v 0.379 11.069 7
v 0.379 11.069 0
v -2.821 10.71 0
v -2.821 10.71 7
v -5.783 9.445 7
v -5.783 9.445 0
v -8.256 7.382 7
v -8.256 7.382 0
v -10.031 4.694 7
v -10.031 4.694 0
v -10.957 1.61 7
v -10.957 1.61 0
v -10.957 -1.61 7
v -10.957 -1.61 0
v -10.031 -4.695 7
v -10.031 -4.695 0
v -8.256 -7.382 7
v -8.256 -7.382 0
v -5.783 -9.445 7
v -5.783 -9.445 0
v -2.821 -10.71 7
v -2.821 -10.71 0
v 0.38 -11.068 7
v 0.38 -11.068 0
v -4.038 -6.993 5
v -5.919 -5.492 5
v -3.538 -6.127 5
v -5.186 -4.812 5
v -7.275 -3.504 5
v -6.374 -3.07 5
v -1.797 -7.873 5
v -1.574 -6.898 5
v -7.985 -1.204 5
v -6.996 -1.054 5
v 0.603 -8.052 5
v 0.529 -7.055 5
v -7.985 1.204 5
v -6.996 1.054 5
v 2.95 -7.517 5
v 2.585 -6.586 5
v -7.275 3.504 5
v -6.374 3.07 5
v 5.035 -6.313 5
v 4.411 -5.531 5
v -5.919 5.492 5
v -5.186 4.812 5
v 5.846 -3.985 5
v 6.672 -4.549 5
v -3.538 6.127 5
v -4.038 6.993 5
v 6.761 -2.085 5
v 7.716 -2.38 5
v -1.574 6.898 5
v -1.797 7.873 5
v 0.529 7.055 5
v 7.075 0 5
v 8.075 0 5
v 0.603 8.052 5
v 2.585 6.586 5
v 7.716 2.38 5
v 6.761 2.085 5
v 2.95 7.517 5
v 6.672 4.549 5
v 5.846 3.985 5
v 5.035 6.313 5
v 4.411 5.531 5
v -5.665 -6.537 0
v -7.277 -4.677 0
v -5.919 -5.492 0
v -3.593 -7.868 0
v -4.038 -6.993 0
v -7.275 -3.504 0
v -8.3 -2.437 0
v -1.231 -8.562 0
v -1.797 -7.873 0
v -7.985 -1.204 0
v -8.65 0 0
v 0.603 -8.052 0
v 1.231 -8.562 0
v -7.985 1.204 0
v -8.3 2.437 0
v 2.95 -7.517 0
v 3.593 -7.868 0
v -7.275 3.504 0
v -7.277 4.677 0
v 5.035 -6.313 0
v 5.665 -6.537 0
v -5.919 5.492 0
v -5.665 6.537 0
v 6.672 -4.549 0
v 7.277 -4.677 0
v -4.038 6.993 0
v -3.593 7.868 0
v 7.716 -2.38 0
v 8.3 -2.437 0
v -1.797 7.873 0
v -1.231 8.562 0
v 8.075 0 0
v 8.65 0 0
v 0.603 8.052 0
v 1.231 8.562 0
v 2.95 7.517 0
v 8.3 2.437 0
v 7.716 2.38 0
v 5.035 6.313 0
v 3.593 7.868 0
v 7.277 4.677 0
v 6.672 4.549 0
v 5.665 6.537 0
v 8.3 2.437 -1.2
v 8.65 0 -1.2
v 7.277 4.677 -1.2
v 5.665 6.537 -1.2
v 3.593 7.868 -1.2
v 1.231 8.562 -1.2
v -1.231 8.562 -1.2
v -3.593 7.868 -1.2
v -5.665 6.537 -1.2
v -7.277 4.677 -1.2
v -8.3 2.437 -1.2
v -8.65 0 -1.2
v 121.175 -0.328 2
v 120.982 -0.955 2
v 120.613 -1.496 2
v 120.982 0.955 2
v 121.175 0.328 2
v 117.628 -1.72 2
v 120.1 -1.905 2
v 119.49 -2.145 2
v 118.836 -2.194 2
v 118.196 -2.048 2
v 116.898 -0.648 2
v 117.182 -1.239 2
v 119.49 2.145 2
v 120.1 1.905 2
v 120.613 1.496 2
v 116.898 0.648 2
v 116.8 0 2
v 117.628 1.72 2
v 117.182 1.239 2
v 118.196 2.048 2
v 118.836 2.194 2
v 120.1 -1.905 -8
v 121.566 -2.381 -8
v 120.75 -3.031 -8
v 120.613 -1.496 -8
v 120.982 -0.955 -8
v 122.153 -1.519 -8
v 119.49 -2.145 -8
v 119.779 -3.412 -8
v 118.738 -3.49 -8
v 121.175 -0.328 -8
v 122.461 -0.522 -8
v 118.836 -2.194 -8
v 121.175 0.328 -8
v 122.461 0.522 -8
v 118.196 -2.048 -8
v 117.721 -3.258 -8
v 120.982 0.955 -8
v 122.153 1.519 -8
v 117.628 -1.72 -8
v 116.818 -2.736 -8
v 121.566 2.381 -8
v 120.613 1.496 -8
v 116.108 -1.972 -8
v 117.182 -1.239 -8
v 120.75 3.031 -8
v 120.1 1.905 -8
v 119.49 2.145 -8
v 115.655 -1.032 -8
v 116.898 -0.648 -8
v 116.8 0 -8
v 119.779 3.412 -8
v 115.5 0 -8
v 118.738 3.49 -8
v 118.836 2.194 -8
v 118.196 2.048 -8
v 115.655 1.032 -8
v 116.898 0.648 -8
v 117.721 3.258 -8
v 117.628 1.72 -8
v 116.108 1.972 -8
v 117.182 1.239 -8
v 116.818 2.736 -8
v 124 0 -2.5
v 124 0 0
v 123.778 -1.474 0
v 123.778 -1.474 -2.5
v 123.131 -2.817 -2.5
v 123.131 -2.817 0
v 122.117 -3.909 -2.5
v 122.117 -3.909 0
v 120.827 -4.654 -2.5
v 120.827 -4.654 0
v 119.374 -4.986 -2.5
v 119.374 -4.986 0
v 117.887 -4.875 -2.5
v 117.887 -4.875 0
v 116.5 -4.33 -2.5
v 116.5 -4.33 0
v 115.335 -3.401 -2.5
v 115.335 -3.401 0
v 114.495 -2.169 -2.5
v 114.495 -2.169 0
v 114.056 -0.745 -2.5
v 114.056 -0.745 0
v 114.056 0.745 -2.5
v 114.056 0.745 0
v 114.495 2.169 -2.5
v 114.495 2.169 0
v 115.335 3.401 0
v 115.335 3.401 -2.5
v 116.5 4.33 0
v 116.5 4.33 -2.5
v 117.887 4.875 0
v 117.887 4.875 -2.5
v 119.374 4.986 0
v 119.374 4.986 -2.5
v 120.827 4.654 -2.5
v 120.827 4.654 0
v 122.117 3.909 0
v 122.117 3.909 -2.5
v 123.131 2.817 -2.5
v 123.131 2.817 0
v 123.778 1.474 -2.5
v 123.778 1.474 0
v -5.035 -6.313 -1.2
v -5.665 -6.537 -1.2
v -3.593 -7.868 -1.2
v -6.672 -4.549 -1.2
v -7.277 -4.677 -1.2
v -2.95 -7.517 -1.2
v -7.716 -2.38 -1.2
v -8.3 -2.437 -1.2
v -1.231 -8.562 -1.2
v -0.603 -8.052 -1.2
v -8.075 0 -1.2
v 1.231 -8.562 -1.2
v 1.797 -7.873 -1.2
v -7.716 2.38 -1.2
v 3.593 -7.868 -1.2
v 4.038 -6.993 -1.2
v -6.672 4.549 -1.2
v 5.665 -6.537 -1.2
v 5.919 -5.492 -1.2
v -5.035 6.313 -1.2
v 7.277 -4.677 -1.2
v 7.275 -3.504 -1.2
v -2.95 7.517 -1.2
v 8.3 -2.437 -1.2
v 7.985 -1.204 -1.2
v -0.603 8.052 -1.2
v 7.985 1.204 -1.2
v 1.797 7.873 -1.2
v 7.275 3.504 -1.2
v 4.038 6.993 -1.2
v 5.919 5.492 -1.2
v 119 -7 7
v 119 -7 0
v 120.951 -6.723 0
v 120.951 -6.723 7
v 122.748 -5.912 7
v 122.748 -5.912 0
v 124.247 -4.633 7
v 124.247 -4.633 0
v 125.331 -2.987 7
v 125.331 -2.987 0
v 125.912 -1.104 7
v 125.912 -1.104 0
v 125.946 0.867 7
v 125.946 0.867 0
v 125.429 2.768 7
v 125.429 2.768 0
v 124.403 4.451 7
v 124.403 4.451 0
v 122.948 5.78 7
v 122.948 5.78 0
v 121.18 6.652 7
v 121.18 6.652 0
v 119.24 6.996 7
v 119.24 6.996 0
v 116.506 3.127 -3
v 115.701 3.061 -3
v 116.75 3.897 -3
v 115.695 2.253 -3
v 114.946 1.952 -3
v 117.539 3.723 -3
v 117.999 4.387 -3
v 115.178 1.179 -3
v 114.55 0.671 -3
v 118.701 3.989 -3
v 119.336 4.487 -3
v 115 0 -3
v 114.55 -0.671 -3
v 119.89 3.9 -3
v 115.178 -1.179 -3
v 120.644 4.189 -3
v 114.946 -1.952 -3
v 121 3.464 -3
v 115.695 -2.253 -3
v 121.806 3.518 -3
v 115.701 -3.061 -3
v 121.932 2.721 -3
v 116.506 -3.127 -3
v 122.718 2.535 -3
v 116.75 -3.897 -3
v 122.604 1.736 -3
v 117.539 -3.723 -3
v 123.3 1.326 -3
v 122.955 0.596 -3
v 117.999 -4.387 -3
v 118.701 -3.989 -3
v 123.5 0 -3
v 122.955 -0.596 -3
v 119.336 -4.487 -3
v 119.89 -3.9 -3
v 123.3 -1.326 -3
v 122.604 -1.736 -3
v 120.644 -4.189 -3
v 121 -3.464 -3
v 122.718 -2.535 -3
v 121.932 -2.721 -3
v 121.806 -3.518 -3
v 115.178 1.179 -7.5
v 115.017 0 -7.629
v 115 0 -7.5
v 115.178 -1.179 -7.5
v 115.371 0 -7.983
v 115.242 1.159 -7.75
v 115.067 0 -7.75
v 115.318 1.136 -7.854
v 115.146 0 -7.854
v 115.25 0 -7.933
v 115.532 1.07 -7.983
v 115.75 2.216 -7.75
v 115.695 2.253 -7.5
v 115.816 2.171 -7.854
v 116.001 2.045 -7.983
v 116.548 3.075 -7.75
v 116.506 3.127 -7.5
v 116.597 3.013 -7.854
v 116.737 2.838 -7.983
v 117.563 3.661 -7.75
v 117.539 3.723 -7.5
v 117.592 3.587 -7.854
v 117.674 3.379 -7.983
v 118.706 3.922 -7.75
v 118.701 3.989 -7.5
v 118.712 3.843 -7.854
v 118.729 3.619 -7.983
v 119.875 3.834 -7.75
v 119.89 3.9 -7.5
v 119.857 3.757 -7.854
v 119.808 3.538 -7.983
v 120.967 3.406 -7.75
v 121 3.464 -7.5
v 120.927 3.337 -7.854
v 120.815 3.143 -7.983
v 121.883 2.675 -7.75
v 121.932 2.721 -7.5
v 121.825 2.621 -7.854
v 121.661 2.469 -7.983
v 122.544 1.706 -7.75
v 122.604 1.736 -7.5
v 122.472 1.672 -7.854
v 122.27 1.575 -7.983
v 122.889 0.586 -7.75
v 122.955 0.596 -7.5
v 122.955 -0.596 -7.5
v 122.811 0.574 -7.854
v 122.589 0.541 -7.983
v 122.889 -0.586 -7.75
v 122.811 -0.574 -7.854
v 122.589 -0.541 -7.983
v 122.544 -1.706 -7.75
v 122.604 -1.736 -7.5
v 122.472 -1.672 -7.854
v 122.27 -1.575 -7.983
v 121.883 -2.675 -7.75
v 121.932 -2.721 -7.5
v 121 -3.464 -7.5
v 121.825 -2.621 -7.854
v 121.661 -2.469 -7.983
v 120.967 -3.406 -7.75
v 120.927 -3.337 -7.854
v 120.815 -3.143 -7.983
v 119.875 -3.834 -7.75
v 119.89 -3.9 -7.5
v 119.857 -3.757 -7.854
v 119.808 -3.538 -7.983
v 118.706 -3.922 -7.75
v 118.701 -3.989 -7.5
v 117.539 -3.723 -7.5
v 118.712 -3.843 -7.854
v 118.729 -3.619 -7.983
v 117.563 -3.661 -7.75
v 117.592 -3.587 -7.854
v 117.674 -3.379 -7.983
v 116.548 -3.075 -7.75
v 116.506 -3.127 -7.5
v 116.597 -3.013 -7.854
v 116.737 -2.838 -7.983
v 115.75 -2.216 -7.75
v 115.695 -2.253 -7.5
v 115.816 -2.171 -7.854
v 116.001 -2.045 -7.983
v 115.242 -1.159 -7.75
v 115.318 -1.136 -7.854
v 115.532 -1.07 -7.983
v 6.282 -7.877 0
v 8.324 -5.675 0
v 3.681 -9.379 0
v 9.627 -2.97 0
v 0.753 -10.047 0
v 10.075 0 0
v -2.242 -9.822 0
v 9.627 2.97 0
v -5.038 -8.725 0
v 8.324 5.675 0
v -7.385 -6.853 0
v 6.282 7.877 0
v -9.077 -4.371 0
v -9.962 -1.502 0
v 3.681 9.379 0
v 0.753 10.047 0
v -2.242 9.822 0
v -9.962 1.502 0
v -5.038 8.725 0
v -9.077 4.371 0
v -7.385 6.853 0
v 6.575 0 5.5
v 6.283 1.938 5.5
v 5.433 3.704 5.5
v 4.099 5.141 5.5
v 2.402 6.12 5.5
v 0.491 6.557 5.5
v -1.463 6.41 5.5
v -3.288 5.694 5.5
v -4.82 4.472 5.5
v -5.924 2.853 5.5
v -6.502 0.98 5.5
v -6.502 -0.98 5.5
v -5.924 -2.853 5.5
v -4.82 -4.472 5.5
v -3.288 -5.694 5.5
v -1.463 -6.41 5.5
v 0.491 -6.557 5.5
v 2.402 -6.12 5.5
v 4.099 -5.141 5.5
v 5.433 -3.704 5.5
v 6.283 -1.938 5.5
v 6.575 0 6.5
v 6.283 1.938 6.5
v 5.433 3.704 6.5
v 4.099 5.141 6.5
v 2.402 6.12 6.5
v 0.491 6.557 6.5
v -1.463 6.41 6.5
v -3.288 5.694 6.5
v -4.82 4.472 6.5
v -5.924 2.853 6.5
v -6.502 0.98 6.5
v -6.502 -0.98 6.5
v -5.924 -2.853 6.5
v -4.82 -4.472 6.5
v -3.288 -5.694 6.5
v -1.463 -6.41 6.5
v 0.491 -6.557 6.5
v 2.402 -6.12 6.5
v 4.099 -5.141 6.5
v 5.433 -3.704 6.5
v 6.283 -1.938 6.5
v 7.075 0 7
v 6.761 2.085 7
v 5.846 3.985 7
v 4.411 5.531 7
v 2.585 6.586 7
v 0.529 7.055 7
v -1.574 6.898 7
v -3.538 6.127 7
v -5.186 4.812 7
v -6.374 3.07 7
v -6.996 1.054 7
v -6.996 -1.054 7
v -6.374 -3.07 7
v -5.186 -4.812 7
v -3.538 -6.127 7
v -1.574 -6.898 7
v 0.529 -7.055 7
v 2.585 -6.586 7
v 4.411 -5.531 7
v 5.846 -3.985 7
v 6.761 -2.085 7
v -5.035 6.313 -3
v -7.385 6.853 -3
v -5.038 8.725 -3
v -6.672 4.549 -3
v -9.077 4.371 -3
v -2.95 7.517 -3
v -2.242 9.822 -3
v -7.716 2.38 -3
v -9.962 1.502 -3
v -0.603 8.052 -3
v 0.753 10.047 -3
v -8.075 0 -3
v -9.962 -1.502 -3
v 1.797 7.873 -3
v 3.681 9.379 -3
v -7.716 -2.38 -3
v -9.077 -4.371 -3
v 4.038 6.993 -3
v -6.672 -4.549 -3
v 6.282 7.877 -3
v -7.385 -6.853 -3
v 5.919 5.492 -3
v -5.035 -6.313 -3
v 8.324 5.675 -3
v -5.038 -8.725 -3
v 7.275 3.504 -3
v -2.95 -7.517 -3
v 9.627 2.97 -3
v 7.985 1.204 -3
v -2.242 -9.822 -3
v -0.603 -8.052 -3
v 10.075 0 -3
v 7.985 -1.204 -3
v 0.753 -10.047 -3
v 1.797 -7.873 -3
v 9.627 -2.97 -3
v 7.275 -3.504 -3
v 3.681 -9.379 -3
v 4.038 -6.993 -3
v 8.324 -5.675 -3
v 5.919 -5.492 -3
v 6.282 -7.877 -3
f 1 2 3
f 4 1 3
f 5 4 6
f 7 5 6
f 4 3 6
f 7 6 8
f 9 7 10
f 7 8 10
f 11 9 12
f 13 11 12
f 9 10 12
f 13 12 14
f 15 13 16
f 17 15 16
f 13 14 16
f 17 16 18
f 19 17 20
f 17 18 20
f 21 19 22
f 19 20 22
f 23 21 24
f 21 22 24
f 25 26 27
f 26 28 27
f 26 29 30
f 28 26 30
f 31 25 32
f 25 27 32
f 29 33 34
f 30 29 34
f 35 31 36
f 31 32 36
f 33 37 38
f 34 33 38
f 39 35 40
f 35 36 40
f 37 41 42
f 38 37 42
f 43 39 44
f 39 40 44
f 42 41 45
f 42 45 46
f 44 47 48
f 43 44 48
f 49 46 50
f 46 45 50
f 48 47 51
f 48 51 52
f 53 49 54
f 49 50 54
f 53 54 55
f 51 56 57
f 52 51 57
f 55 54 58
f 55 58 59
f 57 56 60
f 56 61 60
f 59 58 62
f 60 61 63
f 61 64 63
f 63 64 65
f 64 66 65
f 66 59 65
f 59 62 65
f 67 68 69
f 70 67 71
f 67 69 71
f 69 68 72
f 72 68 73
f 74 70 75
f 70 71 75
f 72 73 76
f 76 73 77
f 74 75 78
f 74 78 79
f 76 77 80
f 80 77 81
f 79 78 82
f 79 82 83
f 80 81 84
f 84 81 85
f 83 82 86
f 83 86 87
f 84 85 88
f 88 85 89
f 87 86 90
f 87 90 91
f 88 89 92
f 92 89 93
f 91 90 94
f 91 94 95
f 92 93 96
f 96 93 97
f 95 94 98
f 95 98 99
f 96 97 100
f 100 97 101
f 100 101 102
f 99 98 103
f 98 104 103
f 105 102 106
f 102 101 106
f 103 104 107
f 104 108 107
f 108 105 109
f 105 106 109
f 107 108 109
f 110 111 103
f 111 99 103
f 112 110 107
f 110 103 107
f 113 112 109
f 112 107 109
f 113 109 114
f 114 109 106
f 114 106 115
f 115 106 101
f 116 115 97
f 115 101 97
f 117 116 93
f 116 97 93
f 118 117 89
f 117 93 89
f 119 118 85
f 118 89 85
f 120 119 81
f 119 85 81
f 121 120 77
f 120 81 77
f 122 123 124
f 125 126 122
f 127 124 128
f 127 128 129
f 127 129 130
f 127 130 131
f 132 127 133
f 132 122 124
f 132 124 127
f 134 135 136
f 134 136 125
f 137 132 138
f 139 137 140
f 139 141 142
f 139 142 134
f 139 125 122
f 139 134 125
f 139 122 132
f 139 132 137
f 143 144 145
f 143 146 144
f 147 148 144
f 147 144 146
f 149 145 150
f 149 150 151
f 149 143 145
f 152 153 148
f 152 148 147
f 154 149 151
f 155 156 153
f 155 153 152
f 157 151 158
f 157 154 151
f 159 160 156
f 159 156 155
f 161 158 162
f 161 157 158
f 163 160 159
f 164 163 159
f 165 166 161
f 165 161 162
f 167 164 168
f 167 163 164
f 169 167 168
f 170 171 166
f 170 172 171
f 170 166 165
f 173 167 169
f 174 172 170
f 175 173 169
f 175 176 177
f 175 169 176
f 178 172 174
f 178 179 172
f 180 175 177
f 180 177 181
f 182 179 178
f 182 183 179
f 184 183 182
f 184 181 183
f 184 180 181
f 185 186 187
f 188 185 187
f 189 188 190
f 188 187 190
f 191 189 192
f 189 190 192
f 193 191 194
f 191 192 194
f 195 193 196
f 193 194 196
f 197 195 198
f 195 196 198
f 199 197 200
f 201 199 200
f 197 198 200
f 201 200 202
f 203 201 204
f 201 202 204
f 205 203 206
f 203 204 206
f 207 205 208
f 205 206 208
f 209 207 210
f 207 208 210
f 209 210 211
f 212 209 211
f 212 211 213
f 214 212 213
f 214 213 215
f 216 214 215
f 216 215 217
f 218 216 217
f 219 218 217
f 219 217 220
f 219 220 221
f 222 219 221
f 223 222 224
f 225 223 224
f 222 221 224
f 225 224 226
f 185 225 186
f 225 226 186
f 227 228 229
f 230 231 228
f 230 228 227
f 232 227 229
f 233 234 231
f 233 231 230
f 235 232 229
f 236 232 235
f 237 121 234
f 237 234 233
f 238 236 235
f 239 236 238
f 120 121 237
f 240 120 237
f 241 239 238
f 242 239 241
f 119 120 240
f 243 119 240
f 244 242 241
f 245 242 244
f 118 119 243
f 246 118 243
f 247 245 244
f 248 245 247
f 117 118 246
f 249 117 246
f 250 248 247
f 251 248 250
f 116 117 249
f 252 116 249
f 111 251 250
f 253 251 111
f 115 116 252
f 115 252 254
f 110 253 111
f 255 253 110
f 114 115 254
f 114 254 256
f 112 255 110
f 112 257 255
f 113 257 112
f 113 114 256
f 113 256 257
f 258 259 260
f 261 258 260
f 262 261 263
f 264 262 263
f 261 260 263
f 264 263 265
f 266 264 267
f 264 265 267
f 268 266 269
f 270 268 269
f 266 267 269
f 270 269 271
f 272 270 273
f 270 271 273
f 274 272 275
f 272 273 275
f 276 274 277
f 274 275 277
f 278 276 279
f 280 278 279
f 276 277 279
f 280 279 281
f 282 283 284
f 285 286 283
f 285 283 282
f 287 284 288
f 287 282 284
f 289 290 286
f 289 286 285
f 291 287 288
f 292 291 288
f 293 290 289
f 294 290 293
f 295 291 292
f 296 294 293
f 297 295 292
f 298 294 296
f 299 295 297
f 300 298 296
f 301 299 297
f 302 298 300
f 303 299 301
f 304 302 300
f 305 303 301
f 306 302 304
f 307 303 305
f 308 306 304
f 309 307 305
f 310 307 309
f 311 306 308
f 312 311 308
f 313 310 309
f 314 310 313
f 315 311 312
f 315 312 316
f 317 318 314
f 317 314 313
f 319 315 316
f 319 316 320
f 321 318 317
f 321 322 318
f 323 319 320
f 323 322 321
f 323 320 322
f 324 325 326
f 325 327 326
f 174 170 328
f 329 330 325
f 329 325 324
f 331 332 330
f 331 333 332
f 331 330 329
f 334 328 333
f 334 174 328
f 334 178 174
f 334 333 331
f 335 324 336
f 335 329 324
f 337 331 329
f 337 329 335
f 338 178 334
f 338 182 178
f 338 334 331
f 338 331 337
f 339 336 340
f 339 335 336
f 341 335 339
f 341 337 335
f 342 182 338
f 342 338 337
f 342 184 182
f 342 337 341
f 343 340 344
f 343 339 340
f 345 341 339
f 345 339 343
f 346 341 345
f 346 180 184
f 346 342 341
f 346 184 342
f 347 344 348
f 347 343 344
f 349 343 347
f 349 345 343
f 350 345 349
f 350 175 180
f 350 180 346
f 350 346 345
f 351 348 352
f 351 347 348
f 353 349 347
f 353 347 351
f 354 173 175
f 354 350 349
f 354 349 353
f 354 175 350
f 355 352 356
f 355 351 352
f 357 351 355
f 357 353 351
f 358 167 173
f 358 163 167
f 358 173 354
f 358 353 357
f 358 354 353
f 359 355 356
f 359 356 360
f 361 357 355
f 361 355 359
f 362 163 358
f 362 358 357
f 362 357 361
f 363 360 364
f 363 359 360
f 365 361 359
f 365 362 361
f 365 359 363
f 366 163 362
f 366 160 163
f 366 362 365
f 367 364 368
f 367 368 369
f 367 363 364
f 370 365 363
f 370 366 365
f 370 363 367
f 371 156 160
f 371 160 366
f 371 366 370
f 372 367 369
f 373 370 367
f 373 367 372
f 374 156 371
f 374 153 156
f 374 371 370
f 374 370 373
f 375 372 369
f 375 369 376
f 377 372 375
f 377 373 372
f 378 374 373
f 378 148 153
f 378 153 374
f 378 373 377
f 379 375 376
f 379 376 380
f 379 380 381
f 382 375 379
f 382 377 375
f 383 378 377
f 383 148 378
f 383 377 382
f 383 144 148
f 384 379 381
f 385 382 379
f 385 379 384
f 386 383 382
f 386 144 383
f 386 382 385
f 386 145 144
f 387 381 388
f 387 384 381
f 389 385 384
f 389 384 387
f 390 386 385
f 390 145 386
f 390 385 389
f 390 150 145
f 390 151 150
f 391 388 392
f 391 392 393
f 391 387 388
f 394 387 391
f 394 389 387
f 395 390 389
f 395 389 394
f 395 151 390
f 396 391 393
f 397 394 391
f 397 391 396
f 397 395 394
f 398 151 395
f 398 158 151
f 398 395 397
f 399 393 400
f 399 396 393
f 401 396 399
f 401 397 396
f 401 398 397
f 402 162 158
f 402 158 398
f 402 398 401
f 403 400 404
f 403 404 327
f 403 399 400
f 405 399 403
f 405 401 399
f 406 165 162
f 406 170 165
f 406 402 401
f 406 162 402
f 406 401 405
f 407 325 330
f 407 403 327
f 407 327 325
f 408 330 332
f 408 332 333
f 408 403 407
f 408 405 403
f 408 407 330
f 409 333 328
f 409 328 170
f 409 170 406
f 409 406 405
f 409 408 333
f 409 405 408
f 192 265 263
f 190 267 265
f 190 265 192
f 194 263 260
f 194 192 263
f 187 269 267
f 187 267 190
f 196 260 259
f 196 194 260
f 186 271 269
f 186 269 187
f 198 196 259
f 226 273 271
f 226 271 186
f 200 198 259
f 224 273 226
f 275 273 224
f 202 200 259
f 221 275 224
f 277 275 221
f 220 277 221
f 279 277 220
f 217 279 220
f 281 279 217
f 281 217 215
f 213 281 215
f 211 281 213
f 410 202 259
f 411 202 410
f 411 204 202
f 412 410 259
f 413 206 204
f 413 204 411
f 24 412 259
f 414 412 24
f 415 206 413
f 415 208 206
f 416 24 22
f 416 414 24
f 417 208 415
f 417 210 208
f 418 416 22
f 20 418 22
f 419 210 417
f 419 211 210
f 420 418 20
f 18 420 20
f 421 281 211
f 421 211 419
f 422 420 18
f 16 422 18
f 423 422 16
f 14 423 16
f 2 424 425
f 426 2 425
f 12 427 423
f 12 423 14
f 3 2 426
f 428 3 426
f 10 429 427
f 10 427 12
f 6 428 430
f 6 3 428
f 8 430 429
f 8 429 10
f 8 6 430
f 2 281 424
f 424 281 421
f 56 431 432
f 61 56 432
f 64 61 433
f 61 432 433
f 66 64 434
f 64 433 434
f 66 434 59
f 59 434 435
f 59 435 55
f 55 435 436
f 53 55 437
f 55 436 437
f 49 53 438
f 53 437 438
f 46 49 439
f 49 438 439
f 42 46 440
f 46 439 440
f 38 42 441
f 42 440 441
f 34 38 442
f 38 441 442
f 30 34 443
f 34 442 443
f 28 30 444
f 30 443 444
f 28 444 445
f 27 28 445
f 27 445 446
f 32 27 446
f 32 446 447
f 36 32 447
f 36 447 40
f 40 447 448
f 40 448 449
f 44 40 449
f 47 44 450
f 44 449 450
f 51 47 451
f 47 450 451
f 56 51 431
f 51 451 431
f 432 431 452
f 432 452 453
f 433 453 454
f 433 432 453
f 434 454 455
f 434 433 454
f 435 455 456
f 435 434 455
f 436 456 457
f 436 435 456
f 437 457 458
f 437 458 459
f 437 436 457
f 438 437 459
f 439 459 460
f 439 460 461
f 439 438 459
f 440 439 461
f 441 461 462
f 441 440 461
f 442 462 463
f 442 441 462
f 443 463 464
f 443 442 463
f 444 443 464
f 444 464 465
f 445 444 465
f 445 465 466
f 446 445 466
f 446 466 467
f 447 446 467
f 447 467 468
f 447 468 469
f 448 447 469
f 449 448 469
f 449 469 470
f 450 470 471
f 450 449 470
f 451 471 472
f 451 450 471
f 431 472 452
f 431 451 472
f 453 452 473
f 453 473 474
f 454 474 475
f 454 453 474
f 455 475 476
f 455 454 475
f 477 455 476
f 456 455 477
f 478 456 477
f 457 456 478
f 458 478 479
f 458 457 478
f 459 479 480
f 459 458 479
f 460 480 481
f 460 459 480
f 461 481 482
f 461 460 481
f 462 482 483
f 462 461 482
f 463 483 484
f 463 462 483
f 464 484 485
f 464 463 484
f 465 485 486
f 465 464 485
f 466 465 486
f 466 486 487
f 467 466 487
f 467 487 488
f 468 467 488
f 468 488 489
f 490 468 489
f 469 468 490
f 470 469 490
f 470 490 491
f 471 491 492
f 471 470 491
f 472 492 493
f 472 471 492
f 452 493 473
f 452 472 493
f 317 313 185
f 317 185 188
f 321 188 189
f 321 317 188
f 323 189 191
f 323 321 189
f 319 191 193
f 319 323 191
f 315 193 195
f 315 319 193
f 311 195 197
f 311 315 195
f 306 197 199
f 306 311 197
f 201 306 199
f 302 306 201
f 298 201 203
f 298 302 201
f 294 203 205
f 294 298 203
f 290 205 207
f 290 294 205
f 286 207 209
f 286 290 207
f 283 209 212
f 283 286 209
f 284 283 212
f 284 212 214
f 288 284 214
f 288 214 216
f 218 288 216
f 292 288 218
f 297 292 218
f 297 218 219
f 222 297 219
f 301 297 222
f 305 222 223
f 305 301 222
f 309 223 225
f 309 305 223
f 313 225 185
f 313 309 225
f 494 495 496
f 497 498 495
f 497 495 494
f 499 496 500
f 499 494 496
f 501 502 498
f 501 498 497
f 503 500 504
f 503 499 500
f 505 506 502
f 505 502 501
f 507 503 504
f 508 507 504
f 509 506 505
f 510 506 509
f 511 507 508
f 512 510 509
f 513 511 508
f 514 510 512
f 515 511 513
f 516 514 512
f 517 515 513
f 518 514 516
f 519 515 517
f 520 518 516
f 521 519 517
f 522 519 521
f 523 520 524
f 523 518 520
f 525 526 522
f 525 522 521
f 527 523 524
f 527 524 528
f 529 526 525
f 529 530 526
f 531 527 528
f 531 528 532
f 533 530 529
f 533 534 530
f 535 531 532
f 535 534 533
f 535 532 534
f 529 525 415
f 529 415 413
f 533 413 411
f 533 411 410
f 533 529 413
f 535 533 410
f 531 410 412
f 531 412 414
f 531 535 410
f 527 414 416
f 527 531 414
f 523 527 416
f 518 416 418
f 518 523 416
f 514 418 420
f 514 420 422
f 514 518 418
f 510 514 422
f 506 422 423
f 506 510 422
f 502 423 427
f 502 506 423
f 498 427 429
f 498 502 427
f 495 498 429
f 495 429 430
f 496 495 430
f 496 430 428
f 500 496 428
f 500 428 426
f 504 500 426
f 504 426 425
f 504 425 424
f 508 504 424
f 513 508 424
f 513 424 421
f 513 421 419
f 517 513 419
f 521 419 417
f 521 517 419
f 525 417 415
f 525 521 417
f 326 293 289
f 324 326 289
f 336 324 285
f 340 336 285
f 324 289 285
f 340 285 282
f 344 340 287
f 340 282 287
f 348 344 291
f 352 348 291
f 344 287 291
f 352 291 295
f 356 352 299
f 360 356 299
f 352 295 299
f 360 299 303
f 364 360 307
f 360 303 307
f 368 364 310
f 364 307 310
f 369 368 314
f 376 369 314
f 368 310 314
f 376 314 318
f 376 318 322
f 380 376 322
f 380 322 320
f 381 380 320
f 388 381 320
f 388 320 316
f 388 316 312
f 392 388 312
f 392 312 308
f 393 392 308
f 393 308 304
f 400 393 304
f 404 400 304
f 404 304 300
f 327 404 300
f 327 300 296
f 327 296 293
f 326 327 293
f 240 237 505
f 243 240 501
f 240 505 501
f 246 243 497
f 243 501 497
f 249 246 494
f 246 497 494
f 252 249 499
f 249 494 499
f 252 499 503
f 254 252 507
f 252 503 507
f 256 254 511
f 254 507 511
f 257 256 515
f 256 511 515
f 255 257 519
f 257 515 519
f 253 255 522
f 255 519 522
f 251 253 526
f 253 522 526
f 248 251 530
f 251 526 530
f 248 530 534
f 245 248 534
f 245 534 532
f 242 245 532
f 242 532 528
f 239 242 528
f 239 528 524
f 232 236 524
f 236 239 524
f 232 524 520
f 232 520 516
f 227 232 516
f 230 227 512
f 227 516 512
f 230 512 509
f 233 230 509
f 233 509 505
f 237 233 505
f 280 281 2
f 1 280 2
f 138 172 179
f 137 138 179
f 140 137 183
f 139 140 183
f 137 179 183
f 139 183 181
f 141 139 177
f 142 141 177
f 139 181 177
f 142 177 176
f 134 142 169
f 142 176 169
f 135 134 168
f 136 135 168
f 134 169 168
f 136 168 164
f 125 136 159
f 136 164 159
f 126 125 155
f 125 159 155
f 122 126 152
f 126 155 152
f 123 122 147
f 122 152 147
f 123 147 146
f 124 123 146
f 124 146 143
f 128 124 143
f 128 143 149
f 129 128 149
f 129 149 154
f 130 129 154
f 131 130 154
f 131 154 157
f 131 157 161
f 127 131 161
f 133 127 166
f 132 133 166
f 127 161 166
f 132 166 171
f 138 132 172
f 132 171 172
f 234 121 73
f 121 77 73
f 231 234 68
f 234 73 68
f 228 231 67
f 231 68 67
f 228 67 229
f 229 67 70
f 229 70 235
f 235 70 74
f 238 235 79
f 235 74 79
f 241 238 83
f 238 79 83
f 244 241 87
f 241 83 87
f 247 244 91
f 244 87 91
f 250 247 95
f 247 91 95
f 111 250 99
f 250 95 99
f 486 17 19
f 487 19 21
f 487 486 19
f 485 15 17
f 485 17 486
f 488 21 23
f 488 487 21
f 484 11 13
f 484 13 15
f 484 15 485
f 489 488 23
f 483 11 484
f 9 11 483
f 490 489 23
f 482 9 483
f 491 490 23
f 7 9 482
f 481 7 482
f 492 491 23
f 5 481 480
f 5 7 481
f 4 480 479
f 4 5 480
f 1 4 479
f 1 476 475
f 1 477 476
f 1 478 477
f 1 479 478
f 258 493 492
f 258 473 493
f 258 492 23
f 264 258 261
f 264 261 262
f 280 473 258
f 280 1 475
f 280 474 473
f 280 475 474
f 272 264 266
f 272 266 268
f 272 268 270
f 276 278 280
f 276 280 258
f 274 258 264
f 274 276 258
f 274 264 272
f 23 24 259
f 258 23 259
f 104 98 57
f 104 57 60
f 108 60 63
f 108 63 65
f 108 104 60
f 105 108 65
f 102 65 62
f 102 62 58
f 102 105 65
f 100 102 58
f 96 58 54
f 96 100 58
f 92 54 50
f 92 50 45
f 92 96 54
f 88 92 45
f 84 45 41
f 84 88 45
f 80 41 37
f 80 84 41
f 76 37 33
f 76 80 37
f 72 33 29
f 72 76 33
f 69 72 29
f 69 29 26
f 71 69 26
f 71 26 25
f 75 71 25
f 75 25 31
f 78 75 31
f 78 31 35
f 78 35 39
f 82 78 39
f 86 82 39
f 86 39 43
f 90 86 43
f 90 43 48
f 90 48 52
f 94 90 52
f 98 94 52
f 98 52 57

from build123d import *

# Parameters (mm, degrees)
SKETCH_1_R          = 8.075
EXTRUDE_1_DEPTH     = 7
EXTRUDE_START       = -2
SKETCH_2_R          = 8.075
SKETCH_2_R_2        = 6.575
EXTRUDE_2_DEPTH     = 2
SKETCH_3_R          = 4
EXTRUDE_3_DEPTH     = 10
SKETCH_4_R          = 5
SKETCH_4_R_2        = 4
EXTRUDE_4_DEPTH     = 3
CHAMFER_1_SIZE      = 0.5
CUT_EXTRUDE_1_DEPTH = 7
CUT_EXTRUDE_2_DEPTH = 5
CUT_EXTRUDE_START   = -2
SKETCH_8_R          = 4
CUT_EXTRUDE_3_DEPTH = 2
FILLET_1_R          = 0.5
SKETCH_9_R          = 2.2
CUT_EXTRUDE_4_DEPTH = 10
EXTRUDE_START_2     = 3
SKETCH_10_R         = 10.075
SKETCH_10_R_2       = 8.075
EXTRUDE_5_DEPTH     = 3
EXTRUDE_6_DEPTH     = 2
EXTRUDE_START_3     = 5
EXTRUDE_7_DEPTH     = 5


with BuildPart() as part:
    # 草图1 → 凸台-拉伸1 (new body)
    with BuildSketch(Plane.XY):
        with BuildLine():
            ThreePointArc((0.37924895, 11.068504652), (-11.074999998, -0.000191538), (0.379631801, -11.068491528))
            Line((0.379631801, -11.068491528), (119, -7))
            ThreePointArc((119, -7), (125.998973572, -0.119870518), (119.239705882, 6.995894588))
            Line((119.239705882, 6.995894588), (0.37924895, 11.068504652))
        make_face()
        Circle(SKETCH_1_R, mode=Mode.SUBTRACT)
    extrude(amount=EXTRUDE_1_DEPTH)

    # 草图2 → 凸台-拉伸2 (add)
    with BuildSketch(Plane.XY.offset(7).offset(EXTRUDE_START)):
        Circle(SKETCH_2_R)
        Circle(SKETCH_2_R_2, mode=Mode.SUBTRACT)
    extrude(amount=EXTRUDE_2_DEPTH)

    # 草图3 → 凸台-拉伸3 (add)
    with BuildSketch(Plane(origin=(0, 0, 0), x_dir=(-1, 0, 0), z_dir=(0, 0, -1))):
        with Locations((-119, 0)):
            Circle(SKETCH_3_R)
    extrude(amount=EXTRUDE_3_DEPTH)

    # 草图4 → 凸台-拉伸4 (add)
    with BuildSketch(Plane(origin=(0, 0, 0), x_dir=(-1, 0, 0), z_dir=(0, 0, -1))):
        with Locations(Location((-119, 0, 0), (0, 0, 180))):
            Circle(SKETCH_4_R)
        with Locations((-119, 0)):
            Circle(SKETCH_4_R_2, mode=Mode.SUBTRACT)
    extrude(amount=EXTRUDE_4_DEPTH)

    # 倒角1
    chamfer_1_edges = [part.edges().sort_by_distance(p)[0] for p in [
        (-6.575, 0, 5),
        (-6.575, 0, 7),
        (123, 0, -10),
        (114, 0, -3),
    ]]
    chamfer(chamfer_1_edges, length=CHAMFER_1_SIZE)

    # 草图5 → 切除-拉伸1 (cut)
    with BuildSketch(Plane(origin=(0, 0, 0), x_dir=(-1, 0, 0), z_dir=(0, 0, -1))):
        with BuildLine():
            ThreePointArc((-12.757234161, -4.640431182), (-13.574999998, 0.000234775), (-12.757073645, 4.640872443))
            Line((-12.757073645, 4.640872443), (-109.090204802, 1.340134001))
            ThreePointArc((-109.090204802, 1.340134001), (-109.022576686, 0.671583213), (-109, 0))
            ThreePointArc((-109, 0), (-109.022449652, -0.669693251), (-109.08969781, -1.336379625))
            Line((-109.08969781, -1.336379625), (-12.757234161, -4.640431182))
        make_face()
    extrude(amount=-CUT_EXTRUDE_1_DEPTH, mode=Mode.SUBTRACT)

    # 草图6 → 切除-拉伸2 (cut)
    with BuildSketch(Plane(origin=(0, 0, 0), x_dir=(-1, 0, 0), z_dir=(0, 0, -1))):
        Polygon((-109.08969781, -1.336379625), (-12.757234161, -4.640431182), (-12.860068961, -7.638668165), (-109.192532609, -4.334616608), align=None)
        Polygon((-12.757073645, 4.640872443), (-109.090204802, 1.340134001), (-109.192935895, 4.338374538), (-12.859804737, 7.63911298), align=None)
    extrude(amount=-CUT_EXTRUDE_2_DEPTH, mode=Mode.SUBTRACT)

    # 草图8 → 切除-拉伸3 (cut)
    with BuildSketch(Plane(origin=(0, 0, -10), x_dir=(-1, 0, 0), z_dir=(0, 0, -1)).offset(CUT_EXTRUDE_START)):
        with Locations((-119, 0)):
            Circle(SKETCH_8_R)
    extrude(amount=CUT_EXTRUDE_3_DEPTH, mode=Mode.SUBTRACT)

    # 圆角1
    fillet_1_edges = [part.edges().sort_by_distance(p)[0] for p in [
        (123, 0, -8),
    ]]
    fillet(fillet_1_edges, radius=FILLET_1_R)

    # 草图9 → 切除-拉伸4 (cut)
    with BuildSketch(Plane(origin=(0, 0, -8), x_dir=(-1, 0, 0), z_dir=(0, 0, -1))):
        with Locations((-119, 0)):
            Circle(SKETCH_9_R)
    extrude(amount=-CUT_EXTRUDE_4_DEPTH, mode=Mode.SUBTRACT)

    # 草图10 → 凸台-拉伸5 (add)
    with BuildSketch(Plane(origin=(0, 0, 0), x_dir=(-1, 0, 0), z_dir=(0, 0, -1)).offset(EXTRUDE_START_2)):
        with Locations(Location((0, 0, 0), (0, 0, 180))):
            Circle(SKETCH_10_R)
        Circle(SKETCH_10_R_2, mode=Mode.SUBTRACT)
    extrude(amount=-EXTRUDE_5_DEPTH)

    # 切除-旋转2: read off the stored shape, not the designer's step
    # 切除-旋转2: loft between two sections, ruled curve by curve
    cut_revolve_2_from = [
        Edge.make_three_point_arc((8.65, 0, -1.2), (0, 8.65, -1.2), (-8.65, 0, -1.2)),
        Edge.make_three_point_arc((-8.65, 0, -1.2), (0, -8.65, -1.2), (8.65, 0, -1.2)),
    ]
    cut_revolve_2_to = [
        Edge.make_three_point_arc((8.65, 0, 0), (0, 8.65, 0), (-8.65, 0, 0)),
        Edge.make_three_point_arc((-8.65, 0, 0), (0, -8.65, 0), (8.65, 0, 0)),
    ]
    cut_revolve_2 = Solid(Shell([*[Face.make_surface_from_curves(cut_revolve_2_from[k], cut_revolve_2_to[k]) for k in range(2)], Face(Wire(cut_revolve_2_from)), Face(Wire(cut_revolve_2_to))]))
    add(cut_revolve_2, mode=Mode.SUBTRACT)

    # 草图12 → 凸台-拉伸6 (add)
    with BuildSketch(Plane.XY.offset(7).offset(EXTRUDE_START)):
        with BuildLine():
            Line((109.08969781, -1.336379625), (12.757234161, -4.640431182))
            ThreePointArc((12.757234161, -4.640431182), (13.574999998, 0.000234775), (12.757073645, 4.640872443))
            Line((12.757073645, 4.640872443), (109.090204802, 1.340134001))
            ThreePointArc((109.090204802, 1.340134001), (109.000000179, 0.001894226), (109.08969781, -1.336379625))
        make_face()
    extrude(amount=EXTRUDE_6_DEPTH)

    # 草图13 → 凸台-拉伸7 (add)
    with BuildSketch(Plane(origin=(0, 0, 5), x_dir=(-1, 0, 0), z_dir=(0, 0, -1)).offset(EXTRUDE_START_3)):
        with BuildLine():
            Line((-109.08969781, -1.336379625), (-109.192532609, -4.334616608))
            Line((-109.192532609, -4.334616608), (-12.860068961, -7.638668165))
            Line((-12.860068961, -7.638668165), (-12.757234161, -4.640431182))
            ThreePointArc((-12.757234161, -4.640431182), (-13.574999998, 0.000234775), (-12.757073645, 4.640872443))
            Line((-12.757073645, 4.640872443), (-12.859804737, 7.63911298))
            Line((-12.859804737, 7.63911298), (-109.192935895, 4.338374538))
            Line((-109.192935895, 4.338374538), (-109.090204802, 1.340134001))
            ThreePointArc((-109.090204802, 1.340134001), (-109.000000179, 0.001894226), (-109.08969781, -1.336379625))
        make_face()
    extrude(amount=-EXTRUDE_7_DEPTH)


solid = part.part
